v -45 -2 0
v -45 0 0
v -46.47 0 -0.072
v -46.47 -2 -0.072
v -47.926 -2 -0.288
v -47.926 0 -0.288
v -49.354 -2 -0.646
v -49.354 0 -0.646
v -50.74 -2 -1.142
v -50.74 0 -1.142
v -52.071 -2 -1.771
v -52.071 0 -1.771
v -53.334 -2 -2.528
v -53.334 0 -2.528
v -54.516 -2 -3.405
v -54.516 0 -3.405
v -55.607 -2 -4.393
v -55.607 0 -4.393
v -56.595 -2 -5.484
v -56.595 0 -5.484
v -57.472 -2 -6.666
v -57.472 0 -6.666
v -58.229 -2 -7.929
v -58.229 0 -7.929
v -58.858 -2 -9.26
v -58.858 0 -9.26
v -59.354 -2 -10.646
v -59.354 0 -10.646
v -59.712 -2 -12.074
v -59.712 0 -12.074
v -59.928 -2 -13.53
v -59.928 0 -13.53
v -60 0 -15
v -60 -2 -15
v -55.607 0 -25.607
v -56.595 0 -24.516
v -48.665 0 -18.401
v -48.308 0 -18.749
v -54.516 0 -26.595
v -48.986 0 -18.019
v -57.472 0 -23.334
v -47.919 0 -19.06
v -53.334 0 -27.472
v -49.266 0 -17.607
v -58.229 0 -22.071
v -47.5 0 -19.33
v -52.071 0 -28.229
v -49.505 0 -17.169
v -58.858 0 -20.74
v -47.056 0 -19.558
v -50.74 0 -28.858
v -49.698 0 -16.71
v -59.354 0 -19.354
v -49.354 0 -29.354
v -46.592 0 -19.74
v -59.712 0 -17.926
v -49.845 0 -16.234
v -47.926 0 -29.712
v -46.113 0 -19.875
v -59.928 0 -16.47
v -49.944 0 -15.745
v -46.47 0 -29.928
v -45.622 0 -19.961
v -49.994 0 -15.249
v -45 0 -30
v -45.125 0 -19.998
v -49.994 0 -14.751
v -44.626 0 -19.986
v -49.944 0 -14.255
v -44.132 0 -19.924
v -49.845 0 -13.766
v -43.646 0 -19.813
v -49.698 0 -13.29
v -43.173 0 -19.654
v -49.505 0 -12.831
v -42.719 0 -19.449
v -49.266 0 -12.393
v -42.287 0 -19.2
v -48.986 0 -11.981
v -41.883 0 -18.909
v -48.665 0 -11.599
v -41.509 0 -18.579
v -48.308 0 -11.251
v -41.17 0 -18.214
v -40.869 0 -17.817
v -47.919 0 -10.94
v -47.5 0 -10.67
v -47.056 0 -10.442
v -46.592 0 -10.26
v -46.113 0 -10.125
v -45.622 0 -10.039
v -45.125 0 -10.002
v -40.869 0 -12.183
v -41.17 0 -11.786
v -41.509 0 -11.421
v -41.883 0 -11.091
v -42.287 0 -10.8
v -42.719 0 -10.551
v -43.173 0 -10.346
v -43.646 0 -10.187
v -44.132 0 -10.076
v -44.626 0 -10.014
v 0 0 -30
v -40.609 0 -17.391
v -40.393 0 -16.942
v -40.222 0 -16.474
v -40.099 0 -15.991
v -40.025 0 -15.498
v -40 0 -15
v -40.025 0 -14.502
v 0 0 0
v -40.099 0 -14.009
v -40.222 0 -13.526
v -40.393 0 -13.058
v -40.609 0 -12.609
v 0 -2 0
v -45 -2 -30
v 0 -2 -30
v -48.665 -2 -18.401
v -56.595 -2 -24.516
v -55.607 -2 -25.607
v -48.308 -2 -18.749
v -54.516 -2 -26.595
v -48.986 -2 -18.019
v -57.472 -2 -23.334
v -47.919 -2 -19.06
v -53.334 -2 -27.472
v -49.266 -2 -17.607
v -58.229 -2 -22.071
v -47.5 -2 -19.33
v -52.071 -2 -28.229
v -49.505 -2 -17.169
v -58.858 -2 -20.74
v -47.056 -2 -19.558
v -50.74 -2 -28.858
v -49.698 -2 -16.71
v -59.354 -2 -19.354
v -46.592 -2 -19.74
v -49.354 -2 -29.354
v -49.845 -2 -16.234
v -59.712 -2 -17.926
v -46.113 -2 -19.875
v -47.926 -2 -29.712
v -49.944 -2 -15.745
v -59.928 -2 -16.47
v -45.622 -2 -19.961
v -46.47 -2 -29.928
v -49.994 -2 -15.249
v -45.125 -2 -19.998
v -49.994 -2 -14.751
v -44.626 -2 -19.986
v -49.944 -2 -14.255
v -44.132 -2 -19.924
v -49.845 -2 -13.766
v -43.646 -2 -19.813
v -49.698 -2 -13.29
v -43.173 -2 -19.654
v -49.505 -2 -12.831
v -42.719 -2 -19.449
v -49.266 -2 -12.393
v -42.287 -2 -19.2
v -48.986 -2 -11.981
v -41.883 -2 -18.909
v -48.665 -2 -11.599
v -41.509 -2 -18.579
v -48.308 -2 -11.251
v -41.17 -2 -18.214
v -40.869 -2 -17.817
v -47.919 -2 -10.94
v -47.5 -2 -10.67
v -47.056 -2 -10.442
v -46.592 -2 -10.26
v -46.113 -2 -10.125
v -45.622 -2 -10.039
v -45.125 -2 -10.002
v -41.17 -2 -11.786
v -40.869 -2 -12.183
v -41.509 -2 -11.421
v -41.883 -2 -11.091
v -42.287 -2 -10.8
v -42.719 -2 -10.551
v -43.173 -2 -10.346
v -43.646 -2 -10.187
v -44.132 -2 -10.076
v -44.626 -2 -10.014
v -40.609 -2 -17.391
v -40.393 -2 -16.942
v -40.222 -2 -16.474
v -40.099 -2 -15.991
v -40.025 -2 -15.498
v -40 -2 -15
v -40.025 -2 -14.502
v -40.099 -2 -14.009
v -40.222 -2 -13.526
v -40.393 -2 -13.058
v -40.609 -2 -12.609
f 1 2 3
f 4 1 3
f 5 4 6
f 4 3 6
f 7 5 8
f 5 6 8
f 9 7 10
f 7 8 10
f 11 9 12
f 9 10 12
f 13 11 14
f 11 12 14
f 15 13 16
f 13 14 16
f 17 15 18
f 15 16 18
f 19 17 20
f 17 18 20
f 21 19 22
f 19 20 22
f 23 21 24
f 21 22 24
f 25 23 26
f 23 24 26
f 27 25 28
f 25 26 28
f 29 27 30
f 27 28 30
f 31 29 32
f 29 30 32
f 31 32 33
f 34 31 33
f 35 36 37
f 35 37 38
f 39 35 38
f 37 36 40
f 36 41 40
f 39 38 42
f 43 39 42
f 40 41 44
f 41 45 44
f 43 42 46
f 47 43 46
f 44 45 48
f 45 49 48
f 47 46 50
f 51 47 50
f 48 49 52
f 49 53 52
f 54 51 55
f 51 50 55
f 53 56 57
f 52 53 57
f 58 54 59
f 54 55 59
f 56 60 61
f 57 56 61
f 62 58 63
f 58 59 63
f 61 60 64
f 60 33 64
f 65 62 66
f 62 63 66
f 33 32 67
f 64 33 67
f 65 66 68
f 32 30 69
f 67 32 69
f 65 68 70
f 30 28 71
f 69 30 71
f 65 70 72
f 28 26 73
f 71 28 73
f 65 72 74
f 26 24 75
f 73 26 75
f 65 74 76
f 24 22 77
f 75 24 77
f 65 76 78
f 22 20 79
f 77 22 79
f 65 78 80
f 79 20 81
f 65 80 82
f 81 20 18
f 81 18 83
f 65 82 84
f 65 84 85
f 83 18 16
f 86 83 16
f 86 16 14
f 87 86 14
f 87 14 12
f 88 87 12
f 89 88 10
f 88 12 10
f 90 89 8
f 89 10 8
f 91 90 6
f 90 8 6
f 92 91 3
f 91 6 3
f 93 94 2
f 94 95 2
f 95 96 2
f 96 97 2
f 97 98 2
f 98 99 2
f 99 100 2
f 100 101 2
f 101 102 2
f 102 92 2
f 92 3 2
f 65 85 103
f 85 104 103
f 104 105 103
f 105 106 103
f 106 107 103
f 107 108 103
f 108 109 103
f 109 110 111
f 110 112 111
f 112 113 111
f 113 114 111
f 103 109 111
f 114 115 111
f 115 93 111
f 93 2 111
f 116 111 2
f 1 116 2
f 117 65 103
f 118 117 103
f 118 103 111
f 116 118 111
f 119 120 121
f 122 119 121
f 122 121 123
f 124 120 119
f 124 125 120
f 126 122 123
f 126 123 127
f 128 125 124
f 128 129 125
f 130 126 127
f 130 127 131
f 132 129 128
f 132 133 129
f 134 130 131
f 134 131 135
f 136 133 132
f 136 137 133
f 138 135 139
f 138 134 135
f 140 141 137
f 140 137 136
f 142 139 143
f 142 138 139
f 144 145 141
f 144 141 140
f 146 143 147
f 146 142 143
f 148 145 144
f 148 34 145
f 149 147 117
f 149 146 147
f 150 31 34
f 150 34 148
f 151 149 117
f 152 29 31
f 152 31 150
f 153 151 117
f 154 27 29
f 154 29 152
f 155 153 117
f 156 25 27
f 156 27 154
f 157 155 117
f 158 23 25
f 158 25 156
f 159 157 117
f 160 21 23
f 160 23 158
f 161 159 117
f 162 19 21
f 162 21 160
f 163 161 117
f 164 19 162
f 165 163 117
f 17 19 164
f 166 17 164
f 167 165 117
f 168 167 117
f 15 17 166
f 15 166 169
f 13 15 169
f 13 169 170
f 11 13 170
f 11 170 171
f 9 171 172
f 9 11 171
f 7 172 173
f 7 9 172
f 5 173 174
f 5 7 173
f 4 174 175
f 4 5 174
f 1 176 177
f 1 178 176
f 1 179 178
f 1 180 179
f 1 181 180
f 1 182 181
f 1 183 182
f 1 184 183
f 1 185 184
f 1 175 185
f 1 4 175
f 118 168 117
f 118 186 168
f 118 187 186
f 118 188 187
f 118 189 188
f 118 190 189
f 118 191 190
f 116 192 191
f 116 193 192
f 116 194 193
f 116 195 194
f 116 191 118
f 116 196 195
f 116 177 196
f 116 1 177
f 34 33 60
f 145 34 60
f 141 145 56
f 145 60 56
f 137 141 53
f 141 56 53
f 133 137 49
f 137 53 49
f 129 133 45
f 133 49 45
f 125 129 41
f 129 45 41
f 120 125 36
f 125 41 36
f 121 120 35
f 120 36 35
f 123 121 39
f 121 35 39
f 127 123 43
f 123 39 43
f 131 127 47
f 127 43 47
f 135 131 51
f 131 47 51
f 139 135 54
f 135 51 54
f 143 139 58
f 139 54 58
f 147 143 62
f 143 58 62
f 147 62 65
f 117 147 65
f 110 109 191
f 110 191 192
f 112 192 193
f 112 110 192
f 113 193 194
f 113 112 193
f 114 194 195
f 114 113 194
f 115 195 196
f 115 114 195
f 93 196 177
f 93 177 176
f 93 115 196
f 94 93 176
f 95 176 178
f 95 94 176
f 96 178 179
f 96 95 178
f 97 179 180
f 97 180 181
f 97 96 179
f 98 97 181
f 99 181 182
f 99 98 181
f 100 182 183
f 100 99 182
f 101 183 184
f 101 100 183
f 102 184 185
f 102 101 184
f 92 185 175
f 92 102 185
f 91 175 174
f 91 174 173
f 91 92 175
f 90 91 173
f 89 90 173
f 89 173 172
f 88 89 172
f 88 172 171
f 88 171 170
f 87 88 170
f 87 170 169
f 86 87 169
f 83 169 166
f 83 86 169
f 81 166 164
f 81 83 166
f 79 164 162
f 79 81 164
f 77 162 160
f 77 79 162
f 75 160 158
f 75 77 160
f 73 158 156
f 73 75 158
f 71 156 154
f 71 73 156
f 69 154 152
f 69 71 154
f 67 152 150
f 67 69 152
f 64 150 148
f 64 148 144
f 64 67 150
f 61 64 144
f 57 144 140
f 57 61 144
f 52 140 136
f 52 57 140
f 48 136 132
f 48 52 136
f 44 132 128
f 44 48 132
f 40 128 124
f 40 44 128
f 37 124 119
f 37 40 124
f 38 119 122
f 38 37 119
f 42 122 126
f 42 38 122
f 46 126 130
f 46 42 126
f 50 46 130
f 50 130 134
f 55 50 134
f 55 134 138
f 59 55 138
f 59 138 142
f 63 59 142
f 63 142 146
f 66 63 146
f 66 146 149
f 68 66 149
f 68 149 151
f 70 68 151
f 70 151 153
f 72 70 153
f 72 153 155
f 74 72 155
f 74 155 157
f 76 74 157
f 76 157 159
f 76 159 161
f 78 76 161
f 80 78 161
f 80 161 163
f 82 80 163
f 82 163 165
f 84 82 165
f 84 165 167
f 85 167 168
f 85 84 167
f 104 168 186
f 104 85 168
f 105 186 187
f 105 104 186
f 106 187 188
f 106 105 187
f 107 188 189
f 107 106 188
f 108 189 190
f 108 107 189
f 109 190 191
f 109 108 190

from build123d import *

# Parameters (mm, degrees)
F0_R     = 5
F1_DEPTH = 2


with BuildPart() as f1:
    # F0 (on Front) → F1 (new body)
    with BuildSketch(Plane.XZ):
        with BuildLine():
            Line((0, -30), (0, 0))
            Line((0, 0), (-45, 0))
            ThreePointArc((-45, 0), (-55.606602, -4.393398), (-60, -15))
            ThreePointArc((-60, -15), (-55.606602, -25.606602), (-45, -30))
            Line((-45, -30), (0, -30))
        make_face()
        with Locations((-45, -15)):
            Circle(F0_R, mode=Mode.SUBTRACT)
    extrude(amount=F1_DEPTH)


solid = f1.part
